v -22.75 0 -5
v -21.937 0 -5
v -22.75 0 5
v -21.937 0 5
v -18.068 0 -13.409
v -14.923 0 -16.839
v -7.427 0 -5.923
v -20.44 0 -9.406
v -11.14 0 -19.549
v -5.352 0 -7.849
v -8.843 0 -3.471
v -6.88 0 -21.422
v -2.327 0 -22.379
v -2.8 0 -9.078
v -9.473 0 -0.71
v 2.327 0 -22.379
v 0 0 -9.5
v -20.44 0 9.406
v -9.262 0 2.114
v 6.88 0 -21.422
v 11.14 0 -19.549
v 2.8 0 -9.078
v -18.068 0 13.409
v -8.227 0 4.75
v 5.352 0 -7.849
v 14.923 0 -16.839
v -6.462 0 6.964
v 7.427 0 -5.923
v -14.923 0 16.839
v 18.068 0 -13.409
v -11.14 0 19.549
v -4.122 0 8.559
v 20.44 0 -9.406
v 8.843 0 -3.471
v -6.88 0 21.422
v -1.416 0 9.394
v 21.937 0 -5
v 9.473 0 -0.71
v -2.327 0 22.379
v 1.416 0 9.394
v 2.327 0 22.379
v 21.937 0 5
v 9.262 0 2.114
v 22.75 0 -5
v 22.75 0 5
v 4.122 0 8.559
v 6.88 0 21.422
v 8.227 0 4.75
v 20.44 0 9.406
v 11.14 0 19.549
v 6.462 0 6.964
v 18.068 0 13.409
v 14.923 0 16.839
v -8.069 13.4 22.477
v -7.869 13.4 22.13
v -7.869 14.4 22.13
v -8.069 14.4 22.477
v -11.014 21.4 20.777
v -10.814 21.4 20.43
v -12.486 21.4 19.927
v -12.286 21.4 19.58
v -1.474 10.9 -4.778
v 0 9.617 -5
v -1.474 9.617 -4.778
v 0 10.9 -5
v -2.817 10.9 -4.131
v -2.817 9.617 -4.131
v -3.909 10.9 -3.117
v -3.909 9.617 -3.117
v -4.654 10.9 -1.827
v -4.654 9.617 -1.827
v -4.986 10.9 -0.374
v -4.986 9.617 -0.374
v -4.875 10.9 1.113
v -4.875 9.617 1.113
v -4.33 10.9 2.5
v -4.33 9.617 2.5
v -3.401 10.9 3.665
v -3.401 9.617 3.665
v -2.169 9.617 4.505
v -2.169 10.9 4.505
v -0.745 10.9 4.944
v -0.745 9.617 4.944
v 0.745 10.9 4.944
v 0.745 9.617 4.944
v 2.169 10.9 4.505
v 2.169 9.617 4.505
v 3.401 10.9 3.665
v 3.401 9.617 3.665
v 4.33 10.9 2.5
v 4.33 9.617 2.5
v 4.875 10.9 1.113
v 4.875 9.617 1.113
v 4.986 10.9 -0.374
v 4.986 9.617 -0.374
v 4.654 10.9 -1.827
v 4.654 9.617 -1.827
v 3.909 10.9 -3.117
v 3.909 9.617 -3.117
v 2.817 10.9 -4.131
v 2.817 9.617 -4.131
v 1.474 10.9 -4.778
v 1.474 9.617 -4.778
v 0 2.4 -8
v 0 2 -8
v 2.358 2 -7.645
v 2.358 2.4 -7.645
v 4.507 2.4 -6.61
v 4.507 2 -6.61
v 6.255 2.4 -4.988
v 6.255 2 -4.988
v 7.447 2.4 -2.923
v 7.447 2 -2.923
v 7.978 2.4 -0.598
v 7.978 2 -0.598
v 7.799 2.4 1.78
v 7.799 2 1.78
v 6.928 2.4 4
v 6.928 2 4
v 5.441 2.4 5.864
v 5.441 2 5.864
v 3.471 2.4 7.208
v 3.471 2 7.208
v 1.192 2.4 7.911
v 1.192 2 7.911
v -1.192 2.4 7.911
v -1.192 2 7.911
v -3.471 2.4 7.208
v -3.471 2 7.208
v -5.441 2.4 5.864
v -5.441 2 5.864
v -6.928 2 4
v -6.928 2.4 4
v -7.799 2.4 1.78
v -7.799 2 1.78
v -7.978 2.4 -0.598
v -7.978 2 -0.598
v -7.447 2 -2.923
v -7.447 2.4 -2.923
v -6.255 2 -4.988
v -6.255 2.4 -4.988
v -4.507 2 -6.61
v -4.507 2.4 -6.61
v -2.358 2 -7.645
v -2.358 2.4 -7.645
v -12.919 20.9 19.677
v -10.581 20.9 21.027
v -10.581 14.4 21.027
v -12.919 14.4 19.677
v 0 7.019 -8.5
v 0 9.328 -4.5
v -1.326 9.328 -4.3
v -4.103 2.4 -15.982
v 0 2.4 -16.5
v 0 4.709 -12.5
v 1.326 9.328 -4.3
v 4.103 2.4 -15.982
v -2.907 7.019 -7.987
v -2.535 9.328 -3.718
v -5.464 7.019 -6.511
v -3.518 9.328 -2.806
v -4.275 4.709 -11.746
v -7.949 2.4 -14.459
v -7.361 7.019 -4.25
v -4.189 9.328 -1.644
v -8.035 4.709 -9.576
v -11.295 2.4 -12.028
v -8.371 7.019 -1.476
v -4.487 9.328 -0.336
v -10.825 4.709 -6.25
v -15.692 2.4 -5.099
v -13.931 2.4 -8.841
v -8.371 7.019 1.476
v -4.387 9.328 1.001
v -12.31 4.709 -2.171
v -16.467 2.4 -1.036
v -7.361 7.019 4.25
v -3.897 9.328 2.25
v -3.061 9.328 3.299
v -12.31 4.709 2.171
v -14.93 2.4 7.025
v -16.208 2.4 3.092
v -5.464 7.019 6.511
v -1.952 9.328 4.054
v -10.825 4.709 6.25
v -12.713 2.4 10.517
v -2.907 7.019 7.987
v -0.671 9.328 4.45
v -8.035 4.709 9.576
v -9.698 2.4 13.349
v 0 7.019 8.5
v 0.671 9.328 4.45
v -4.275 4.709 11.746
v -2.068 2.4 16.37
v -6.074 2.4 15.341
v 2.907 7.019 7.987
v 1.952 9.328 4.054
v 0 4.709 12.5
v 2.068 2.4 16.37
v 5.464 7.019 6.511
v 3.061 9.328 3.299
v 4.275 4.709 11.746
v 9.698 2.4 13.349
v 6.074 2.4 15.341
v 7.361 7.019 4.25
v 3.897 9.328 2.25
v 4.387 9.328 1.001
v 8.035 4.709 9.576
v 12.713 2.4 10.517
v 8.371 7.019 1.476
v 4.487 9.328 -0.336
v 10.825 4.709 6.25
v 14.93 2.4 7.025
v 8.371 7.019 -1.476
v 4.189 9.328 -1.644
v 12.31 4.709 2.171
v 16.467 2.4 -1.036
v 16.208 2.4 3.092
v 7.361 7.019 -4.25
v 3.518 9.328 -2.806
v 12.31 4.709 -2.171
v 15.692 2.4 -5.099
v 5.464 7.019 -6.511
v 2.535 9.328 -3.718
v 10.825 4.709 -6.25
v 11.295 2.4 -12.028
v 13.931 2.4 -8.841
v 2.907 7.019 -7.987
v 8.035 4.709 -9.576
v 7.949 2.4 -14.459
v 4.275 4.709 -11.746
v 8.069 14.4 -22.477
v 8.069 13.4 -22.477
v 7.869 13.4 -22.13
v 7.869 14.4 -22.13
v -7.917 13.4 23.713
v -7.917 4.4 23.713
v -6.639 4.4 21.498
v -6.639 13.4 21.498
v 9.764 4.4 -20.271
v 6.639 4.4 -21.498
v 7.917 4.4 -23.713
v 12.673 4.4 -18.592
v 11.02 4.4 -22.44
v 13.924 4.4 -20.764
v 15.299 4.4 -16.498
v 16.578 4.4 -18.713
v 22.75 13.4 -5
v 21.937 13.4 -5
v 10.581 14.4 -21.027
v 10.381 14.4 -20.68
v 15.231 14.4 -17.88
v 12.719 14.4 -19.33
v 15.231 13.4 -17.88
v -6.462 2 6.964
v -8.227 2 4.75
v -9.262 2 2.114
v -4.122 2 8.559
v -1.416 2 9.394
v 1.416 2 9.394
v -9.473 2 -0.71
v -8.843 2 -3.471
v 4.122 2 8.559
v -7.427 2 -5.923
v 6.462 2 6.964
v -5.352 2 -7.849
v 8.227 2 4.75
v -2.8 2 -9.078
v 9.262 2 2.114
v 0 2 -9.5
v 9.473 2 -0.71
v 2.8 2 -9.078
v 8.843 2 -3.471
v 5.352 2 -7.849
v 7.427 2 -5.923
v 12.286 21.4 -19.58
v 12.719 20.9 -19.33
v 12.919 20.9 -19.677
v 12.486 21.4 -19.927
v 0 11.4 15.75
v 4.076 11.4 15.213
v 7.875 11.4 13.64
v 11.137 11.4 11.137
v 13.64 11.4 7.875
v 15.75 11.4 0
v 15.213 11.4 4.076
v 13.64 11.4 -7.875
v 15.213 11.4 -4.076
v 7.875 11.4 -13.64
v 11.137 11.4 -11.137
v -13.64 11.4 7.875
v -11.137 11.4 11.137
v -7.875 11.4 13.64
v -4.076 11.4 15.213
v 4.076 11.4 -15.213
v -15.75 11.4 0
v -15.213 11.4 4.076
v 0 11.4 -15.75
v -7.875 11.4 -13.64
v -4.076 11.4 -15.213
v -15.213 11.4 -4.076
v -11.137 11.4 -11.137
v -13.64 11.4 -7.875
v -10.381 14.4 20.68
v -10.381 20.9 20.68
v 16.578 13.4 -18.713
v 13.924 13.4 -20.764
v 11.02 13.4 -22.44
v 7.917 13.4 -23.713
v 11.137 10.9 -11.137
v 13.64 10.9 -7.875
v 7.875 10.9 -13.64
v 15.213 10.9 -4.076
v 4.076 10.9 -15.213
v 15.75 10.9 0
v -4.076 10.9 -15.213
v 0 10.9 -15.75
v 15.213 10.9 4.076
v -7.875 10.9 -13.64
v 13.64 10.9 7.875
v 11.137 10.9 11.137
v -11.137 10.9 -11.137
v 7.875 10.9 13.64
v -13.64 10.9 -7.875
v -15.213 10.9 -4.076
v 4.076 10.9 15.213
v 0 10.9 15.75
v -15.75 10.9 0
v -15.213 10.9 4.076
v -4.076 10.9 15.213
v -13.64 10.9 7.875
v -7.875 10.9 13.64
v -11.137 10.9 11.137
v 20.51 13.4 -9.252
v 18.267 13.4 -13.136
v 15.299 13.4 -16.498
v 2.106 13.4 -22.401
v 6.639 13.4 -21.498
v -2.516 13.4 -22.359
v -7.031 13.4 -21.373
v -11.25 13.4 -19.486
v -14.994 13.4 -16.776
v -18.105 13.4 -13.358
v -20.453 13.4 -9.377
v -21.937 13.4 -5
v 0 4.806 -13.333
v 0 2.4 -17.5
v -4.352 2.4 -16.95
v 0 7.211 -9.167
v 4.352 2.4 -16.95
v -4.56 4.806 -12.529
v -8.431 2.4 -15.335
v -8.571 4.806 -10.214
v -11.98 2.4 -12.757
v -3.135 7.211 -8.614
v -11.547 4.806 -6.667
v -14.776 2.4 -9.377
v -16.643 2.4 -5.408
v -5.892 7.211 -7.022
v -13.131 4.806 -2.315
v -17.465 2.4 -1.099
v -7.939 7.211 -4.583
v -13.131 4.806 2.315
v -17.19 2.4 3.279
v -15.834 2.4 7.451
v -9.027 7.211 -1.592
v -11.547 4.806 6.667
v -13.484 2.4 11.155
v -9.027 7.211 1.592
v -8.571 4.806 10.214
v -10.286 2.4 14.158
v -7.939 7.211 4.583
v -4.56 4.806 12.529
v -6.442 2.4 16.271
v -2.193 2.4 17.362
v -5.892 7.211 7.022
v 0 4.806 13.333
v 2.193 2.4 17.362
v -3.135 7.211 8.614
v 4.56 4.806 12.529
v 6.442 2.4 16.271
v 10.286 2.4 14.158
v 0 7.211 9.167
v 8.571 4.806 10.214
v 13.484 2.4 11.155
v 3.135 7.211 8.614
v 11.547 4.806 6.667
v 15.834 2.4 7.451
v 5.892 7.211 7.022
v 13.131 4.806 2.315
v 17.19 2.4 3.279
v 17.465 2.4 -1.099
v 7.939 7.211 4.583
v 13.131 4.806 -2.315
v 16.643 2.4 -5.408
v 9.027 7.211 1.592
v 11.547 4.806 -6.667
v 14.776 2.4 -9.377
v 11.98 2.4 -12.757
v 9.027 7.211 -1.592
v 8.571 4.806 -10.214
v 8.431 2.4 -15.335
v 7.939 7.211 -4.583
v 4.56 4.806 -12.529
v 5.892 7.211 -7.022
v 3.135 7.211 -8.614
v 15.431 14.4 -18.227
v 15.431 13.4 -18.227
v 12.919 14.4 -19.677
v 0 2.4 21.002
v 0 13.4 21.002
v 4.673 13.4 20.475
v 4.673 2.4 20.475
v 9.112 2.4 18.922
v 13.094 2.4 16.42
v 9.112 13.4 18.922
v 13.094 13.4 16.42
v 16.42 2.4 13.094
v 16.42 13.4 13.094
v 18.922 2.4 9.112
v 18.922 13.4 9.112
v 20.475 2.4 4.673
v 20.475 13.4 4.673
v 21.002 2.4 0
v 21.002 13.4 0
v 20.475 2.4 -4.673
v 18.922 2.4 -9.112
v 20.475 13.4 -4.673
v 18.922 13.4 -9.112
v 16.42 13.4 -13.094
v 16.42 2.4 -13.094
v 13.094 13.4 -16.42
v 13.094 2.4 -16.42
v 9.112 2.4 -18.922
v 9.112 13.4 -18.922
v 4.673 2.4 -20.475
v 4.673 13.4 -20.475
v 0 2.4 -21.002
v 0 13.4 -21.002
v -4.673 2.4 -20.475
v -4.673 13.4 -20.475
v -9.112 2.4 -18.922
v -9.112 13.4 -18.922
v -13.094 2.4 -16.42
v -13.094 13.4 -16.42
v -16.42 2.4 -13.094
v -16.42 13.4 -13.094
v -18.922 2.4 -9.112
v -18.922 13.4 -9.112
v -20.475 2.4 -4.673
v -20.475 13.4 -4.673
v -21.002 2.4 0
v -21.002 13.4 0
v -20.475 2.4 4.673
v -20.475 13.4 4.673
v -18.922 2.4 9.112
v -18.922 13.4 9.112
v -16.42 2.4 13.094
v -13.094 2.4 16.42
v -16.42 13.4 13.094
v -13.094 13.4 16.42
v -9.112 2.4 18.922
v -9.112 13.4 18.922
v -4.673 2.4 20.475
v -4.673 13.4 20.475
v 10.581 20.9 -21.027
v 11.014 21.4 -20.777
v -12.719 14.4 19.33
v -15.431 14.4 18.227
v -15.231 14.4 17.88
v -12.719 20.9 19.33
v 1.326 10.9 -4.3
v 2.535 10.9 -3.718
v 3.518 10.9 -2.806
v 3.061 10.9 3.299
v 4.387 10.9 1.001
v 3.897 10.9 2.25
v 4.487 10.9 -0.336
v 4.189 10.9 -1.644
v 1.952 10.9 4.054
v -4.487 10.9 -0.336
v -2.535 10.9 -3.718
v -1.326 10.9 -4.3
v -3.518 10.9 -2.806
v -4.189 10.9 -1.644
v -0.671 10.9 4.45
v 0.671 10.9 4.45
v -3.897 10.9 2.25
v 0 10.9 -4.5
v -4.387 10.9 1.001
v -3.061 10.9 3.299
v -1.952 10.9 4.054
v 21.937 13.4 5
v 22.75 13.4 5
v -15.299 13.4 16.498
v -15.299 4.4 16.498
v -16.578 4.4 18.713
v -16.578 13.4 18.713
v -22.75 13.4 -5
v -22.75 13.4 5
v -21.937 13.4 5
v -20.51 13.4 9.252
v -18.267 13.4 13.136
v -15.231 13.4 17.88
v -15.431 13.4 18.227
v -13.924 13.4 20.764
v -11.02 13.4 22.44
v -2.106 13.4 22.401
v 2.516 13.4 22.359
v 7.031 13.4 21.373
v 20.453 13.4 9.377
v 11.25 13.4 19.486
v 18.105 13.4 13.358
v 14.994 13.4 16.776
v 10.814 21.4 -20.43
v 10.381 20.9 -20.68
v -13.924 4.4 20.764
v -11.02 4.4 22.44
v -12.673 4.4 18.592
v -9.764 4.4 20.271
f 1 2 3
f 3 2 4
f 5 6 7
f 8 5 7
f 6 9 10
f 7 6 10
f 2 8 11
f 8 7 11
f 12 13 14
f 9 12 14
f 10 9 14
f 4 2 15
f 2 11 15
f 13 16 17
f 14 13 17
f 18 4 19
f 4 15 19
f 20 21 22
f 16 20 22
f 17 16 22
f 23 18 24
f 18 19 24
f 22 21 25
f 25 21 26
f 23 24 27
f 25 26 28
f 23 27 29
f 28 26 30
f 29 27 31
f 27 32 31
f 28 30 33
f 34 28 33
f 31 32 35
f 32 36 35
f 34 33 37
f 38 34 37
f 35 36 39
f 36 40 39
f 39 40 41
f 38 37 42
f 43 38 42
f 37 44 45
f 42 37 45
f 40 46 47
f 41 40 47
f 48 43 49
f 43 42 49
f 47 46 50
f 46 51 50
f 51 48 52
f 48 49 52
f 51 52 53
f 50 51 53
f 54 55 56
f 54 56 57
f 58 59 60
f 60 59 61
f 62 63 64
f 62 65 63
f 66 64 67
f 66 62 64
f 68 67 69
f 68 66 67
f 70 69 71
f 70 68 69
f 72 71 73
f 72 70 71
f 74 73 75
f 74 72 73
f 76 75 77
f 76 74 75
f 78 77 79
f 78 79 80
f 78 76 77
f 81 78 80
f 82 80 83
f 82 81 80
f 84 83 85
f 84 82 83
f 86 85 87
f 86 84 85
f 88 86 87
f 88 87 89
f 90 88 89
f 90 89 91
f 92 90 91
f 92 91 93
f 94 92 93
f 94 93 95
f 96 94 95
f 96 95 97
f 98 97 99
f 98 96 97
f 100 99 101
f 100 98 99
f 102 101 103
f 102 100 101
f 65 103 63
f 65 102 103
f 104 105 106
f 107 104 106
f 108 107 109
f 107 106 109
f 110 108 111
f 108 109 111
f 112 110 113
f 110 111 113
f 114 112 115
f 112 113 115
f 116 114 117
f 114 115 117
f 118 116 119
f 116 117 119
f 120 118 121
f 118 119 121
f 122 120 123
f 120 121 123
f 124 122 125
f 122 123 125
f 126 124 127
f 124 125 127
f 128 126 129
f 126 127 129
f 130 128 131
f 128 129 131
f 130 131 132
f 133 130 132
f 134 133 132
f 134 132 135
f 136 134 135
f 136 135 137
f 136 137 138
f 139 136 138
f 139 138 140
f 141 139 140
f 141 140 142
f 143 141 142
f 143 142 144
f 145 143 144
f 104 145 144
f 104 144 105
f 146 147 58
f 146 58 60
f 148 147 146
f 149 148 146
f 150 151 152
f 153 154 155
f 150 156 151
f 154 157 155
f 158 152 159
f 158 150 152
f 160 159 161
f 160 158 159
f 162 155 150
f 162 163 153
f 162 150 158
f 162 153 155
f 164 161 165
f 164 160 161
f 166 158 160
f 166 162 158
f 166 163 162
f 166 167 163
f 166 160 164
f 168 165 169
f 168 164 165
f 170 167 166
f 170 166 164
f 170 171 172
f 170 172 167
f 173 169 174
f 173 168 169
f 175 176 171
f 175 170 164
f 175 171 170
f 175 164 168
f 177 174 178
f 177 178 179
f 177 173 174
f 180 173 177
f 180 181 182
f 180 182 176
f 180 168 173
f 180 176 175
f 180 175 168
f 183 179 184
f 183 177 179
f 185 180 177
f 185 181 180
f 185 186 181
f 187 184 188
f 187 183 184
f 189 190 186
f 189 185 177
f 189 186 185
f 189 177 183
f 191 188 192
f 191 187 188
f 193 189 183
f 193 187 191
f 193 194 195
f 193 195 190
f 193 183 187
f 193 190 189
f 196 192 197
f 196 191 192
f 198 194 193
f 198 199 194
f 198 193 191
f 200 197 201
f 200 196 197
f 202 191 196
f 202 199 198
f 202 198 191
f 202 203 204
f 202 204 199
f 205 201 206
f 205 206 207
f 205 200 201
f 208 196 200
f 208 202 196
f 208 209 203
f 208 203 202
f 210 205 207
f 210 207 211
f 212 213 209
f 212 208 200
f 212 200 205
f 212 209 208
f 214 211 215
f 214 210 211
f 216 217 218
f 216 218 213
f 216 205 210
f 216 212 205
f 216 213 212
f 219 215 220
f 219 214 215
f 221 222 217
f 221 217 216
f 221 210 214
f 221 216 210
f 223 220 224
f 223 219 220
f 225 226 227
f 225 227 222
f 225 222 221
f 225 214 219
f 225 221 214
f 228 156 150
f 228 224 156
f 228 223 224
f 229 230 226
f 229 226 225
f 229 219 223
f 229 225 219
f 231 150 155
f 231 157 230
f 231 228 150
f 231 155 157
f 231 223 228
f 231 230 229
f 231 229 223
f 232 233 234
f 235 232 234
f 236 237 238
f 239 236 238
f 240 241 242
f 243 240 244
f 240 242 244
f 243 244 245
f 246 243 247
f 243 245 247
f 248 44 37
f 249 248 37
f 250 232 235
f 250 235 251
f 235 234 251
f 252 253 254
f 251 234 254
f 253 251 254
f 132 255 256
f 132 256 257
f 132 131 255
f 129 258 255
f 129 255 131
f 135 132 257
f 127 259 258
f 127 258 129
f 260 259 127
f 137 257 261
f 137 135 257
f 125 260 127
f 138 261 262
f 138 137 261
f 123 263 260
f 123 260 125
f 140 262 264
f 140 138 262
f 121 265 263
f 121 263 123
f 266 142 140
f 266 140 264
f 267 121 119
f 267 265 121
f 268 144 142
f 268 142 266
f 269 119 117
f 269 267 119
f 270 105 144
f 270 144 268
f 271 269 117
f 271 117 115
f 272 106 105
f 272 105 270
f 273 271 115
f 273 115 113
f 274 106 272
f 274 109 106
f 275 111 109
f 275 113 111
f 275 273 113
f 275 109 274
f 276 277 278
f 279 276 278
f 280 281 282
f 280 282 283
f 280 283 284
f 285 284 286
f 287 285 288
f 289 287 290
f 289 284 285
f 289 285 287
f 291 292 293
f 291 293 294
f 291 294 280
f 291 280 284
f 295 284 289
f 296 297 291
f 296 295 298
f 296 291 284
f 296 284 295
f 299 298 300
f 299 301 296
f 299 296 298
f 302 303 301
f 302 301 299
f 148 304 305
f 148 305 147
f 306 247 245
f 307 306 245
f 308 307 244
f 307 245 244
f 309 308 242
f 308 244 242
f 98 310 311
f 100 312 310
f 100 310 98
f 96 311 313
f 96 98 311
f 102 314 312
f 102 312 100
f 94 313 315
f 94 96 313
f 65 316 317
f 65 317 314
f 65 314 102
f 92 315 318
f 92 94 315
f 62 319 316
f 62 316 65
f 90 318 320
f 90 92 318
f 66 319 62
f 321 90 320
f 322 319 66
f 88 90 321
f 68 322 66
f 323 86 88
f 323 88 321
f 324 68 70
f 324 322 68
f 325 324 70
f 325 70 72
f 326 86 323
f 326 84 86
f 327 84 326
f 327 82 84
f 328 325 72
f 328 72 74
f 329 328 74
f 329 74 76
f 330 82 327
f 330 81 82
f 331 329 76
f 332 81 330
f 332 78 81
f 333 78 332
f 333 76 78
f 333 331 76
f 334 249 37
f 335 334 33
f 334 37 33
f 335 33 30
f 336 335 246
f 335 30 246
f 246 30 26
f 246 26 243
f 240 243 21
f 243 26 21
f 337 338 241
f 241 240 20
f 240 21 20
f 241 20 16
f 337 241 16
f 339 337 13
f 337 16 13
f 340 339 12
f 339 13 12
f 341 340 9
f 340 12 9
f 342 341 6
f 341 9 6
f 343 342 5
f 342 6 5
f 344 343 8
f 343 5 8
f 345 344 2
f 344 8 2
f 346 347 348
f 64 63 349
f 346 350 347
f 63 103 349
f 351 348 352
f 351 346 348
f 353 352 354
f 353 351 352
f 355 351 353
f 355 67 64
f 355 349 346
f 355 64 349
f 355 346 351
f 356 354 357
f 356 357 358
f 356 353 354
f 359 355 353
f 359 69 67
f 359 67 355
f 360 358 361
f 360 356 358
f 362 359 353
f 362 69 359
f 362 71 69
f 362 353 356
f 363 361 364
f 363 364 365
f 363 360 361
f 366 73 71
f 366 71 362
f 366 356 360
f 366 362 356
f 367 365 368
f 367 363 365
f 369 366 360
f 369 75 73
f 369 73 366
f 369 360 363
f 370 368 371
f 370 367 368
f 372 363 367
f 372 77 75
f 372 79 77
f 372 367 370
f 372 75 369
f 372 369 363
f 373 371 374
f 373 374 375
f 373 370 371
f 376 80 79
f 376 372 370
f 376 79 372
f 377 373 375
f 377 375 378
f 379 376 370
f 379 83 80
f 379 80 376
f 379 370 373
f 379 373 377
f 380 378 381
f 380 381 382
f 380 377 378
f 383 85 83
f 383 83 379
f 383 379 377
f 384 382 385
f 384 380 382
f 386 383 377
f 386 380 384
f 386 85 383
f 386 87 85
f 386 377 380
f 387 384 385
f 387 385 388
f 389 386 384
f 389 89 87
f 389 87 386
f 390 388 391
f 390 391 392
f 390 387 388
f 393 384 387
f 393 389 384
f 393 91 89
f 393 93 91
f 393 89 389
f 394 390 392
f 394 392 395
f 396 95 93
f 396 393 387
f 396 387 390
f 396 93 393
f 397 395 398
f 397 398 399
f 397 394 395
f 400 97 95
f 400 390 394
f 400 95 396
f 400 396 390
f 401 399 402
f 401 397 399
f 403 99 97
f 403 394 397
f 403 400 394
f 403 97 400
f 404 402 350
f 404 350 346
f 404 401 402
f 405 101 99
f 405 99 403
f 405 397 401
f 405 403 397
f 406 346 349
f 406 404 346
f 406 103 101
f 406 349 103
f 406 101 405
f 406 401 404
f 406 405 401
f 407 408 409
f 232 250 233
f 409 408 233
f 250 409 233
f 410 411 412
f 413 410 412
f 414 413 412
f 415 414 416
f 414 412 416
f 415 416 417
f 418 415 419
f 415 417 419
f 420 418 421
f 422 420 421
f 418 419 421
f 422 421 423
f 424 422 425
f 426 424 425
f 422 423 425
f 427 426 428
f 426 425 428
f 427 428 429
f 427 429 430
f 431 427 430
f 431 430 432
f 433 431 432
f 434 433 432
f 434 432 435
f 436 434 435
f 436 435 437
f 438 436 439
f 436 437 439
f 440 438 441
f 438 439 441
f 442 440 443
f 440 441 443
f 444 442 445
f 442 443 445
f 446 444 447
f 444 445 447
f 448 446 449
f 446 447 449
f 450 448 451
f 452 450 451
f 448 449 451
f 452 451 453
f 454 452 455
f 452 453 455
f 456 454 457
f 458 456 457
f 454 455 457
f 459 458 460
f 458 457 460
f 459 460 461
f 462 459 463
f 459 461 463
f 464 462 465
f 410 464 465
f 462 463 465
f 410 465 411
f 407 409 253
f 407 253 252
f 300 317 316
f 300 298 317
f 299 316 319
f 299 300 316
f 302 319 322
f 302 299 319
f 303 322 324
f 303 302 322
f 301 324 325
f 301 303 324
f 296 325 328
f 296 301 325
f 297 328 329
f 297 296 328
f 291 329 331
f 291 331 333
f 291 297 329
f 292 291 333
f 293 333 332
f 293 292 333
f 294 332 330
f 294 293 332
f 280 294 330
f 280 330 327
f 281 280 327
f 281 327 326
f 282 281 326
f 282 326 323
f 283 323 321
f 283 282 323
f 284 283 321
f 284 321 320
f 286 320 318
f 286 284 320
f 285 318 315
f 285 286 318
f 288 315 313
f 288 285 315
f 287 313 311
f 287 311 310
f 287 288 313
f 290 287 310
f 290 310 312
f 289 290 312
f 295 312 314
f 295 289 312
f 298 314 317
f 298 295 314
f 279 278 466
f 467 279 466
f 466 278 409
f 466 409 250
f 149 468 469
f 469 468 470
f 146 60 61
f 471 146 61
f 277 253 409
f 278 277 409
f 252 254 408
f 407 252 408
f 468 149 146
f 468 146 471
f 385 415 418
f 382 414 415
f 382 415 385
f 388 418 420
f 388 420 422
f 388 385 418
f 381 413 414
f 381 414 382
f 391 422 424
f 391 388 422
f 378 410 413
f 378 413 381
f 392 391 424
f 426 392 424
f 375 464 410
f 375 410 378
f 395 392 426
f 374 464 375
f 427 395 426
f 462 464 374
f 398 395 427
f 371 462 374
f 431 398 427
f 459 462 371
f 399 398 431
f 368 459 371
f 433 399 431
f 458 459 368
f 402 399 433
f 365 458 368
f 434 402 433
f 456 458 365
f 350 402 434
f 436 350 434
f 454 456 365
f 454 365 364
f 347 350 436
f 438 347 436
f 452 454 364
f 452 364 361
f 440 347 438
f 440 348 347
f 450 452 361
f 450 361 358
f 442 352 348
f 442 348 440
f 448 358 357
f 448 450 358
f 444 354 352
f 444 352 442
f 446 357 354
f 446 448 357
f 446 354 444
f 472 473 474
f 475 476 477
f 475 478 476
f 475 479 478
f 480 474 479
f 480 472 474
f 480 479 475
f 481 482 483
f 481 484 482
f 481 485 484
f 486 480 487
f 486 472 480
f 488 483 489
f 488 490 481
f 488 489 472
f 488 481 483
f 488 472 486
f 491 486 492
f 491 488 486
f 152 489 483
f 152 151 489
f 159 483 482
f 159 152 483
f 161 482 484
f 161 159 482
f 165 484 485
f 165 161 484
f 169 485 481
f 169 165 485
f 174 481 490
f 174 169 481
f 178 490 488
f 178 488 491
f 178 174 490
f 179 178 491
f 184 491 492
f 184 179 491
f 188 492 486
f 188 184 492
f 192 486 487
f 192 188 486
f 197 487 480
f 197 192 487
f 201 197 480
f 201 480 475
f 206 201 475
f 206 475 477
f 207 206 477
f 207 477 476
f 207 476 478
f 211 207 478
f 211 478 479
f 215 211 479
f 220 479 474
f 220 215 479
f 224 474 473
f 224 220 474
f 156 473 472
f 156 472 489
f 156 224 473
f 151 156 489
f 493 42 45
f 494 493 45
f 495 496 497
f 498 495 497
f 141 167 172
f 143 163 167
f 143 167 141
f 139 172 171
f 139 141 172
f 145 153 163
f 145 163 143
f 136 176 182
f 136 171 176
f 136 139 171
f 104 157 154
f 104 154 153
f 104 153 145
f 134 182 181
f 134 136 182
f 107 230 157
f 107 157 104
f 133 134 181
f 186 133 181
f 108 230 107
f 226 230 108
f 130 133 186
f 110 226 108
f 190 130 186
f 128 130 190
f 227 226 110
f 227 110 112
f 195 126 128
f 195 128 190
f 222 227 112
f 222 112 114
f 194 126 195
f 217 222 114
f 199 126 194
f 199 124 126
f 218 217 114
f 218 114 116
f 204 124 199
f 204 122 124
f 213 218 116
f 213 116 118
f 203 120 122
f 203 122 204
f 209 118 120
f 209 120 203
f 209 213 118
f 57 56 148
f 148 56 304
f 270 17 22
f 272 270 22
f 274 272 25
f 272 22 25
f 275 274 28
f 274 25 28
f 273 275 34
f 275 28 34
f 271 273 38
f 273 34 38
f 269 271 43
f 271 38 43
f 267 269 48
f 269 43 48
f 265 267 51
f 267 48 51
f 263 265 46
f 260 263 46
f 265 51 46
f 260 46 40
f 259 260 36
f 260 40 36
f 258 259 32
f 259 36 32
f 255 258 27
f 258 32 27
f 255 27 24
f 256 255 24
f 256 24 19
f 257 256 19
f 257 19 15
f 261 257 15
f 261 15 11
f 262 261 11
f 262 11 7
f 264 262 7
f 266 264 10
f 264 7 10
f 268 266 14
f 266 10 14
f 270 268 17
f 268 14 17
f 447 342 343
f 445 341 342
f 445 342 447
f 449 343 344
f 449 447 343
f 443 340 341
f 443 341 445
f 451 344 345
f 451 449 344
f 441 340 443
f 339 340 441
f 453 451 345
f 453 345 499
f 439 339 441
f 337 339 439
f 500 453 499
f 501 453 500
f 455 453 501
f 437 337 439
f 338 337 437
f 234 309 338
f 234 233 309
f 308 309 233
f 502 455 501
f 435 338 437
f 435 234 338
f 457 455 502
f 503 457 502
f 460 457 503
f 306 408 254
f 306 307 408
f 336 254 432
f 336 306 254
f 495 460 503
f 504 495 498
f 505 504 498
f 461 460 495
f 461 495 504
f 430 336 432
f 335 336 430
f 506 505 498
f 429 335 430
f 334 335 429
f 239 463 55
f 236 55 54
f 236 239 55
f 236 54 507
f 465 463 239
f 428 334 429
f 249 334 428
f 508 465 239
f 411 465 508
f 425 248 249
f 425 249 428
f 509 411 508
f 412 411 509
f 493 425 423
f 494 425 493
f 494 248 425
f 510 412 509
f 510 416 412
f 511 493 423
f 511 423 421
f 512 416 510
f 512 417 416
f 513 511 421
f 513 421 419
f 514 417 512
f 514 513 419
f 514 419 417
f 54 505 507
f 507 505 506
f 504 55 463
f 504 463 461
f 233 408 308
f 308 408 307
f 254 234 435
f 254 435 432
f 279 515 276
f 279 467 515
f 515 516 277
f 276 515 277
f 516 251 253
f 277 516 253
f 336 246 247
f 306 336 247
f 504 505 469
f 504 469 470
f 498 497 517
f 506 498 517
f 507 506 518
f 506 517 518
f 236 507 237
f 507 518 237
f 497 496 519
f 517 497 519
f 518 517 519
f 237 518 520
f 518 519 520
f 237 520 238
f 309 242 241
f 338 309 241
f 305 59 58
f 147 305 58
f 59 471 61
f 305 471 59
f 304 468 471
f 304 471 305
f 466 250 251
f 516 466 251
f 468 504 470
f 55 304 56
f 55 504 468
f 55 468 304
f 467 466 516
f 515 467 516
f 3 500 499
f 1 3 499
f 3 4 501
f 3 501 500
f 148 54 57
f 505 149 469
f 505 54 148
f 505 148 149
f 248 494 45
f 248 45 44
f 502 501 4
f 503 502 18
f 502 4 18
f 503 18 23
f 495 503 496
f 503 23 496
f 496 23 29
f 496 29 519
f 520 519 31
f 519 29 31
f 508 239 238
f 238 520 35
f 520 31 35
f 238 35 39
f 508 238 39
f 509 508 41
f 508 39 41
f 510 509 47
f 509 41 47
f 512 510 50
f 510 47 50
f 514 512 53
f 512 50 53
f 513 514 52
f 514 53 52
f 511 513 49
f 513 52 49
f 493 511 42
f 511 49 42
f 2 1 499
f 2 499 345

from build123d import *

# Parameters (mm, degrees)
SKETCH_1_R          = 22.5
EXTRUDE_1_DEPTH     = 13.4
SKETCH_5_R          = 21.001588026
CUT_EXTRUDE_1_DEPTH = 11
SKETCH_6_R          = 8
CUT_EXTRUDE_2_DEPTH = 3
EXTRUDE_START       = -9
EXTRUDE_6_DEPTH     = 9
EXTRUDE_7_DEPTH     = 1
EXTRUDE_8_DEPTH     = 7
CHAMFER_1_SIZE      = 0.5
SKETCH_13_R         = 9.5
CUT_EXTRUDE_4_DEPTH = 2
EXTRUDE_10_DEPTH    = 13.4


with BuildPart() as part:
    # Эскиз1 → Бобышка-Вытянуть1 (new body)
    with BuildSketch(Plane(origin=(0, 0, 0), x_dir=(1, 0, 0), z_dir=(0, 1, 0))):
        with Locations(Location((0, 0, 0), (0, 0, 270))):
            Circle(SKETCH_1_R)
    extrude(amount=EXTRUDE_1_DEPTH)

    # Эскиз5 → Вырез-Вытянуть1 (cut)
    with BuildSketch(Plane(origin=(0, 13.4, 0), x_dir=(1, 0, 0), z_dir=(0, 1, 0))):
        with Locations(Location((0, 0, 0), (0, 0, 270))):
            Circle(SKETCH_5_R)
    extrude(amount=-CUT_EXTRUDE_1_DEPTH, mode=Mode.SUBTRACT)

    # Эскиз6 → Вырез-Вытянуть2 (cut)
    with BuildSketch(Plane(origin=(0, 0, 0), x_dir=(-1, 0, 0), z_dir=(0, -1, 0))):
        with Locations(Location((0, 0, 0), (0, 0, 90))):
            Circle(SKETCH_6_R)
    extrude(amount=-CUT_EXTRUDE_2_DEPTH, mode=Mode.SUBTRACT)

    # Эскиз8 → Бобышка-Вытянуть6 (add)
    with BuildSketch(Plane(origin=(0, 13.4, 0), x_dir=(1, 0, 0), z_dir=(0, 1, 0)).offset(EXTRUDE_START)):
        with BuildLine():
            Line((7.917321695, 23.713203436), (6.638578465, 21.498355192))
            ThreePointArc((6.638578465, 21.498355192), (11.25, 19.485571585), (15.298832503, 16.498355192))
            Line((15.298832503, 16.498355192), (16.577575733, 18.713203436))
            ThreePointArc((16.577575733, 18.713203436), (12.5, 21.650635095), (7.917321695, 23.713203436))
        make_face()
        with BuildLine():
            Line((-7.917321695, -23.713203436), (-6.638578465, -21.498355192))
            ThreePointArc((-6.638578465, -21.498355192), (-11.25, -19.485571585), (-15.298832503, -16.498355192))
            Line((-15.298832503, -16.498355192), (-16.577575733, -18.713203436))
            ThreePointArc((-16.577575733, -18.713203436), (-12.5, -21.650635095), (-7.917321695, -23.713203436))
        make_face()
    extrude(amount=EXTRUDE_6_DEPTH)

    # Эскиз9 → Бобышка-Вытянуть7 (add)
    with BuildSketch(Plane(origin=(0, 13.4, 0), x_dir=(1, 0, 0), z_dir=(0, 1, 0))):
        Polygon((8.069392034, 22.476596989), (7.869392034, 22.130186827), (15.230607966, 17.880186827), (15.430607966, 18.226596989), align=None)
        Polygon((-8.069392034, -22.476596989), (-15.430607966, -18.226596989), (-15.230607966, -17.880186827), (-7.869392034, -22.130186827), align=None)
    extrude(amount=EXTRUDE_7_DEPTH)

    # Эскиз10 → Бобышка-Вытянуть8 (add)
    with BuildSketch(Plane(origin=(0, 14.4, 0), x_dir=(1, 0, 0), z_dir=(0, 1, 0))):
        Polygon((10.580865705, 21.026596989), (10.380865705, 20.680186827), (12.719134295, 19.330186827), (12.919134295, 19.676596989), align=None)
        Polygon((-10.580865705, -21.026596989), (-12.919134295, -19.676596989), (-12.719134295, -19.330186827), (-10.380865705, -20.680186827), align=None)
    extrude(amount=EXTRUDE_8_DEPTH)

    # Фаска1
    chamfer_1_edges = [part.edges().sort_by_distance(p)[0] for p in [
        (10.480865705, 21.4, -20.853391908),
        (12.819134295, 21.4, -19.503391908),
        (-10.480865705, 21.4, 20.853391908),
        (-12.819134295, 21.4, 19.503391908),
    ]]
    chamfer(chamfer_1_edges, length=CHAMFER_1_SIZE)

    # Эскиз11 → Повернуть1 (revolve)
    with BuildSketch(Plane(origin=(0, 0, 0), x_dir=(0, 0, -1), z_dir=(1, 0, 0))):
        Polygon((20.5, 2.4), (17.5, 2.4), (5, 9.616878365), (5, 10.9), (15.75, 10.9), (15.75, 11.4), (0, 11.4), (0, 10.9), (4.5, 10.9), (4.5, 9.32820323), (17.366025404, 1.9), (20.5, 1.9), align=None)
    revolve(axis=Axis((0, 0, 0), (0, 1, 0)))

    # Эскиз13 → Вырез-Вытянуть4 (cut)
    with BuildSketch(Plane.XZ):
        with Locations(Location((0, 0, 0), (0, 0, 270))):
            Circle(SKETCH_13_R)
    extrude(amount=-CUT_EXTRUDE_4_DEPTH, mode=Mode.SUBTRACT)

    # Эскиз15 → Бобышка-Вытянуть10 (add)
    with BuildSketch(Plane.XZ):
        with BuildLine():
            Line((-21.937410968, 5), (-22.75, 5))
            Line((-22.75, 5), (-22.75, -5))
            Line((-22.75, -5), (-21.937410968, -5))
            ThreePointArc((-21.937410968, -5), (-22.5, 0), (-21.937410968, 5))
        make_face()
        with BuildLine():
            Line((22.75, 5), (22.75, -5))
            Line((22.75, -5), (21.937410968, -5))
            ThreePointArc((21.937410968, -5), (22.5, 0), (21.937410968, 5))
            Line((21.937410968, 5), (22.75, 5))
        make_face()
    extrude(amount=-EXTRUDE_10_DEPTH)


solid = part.part
